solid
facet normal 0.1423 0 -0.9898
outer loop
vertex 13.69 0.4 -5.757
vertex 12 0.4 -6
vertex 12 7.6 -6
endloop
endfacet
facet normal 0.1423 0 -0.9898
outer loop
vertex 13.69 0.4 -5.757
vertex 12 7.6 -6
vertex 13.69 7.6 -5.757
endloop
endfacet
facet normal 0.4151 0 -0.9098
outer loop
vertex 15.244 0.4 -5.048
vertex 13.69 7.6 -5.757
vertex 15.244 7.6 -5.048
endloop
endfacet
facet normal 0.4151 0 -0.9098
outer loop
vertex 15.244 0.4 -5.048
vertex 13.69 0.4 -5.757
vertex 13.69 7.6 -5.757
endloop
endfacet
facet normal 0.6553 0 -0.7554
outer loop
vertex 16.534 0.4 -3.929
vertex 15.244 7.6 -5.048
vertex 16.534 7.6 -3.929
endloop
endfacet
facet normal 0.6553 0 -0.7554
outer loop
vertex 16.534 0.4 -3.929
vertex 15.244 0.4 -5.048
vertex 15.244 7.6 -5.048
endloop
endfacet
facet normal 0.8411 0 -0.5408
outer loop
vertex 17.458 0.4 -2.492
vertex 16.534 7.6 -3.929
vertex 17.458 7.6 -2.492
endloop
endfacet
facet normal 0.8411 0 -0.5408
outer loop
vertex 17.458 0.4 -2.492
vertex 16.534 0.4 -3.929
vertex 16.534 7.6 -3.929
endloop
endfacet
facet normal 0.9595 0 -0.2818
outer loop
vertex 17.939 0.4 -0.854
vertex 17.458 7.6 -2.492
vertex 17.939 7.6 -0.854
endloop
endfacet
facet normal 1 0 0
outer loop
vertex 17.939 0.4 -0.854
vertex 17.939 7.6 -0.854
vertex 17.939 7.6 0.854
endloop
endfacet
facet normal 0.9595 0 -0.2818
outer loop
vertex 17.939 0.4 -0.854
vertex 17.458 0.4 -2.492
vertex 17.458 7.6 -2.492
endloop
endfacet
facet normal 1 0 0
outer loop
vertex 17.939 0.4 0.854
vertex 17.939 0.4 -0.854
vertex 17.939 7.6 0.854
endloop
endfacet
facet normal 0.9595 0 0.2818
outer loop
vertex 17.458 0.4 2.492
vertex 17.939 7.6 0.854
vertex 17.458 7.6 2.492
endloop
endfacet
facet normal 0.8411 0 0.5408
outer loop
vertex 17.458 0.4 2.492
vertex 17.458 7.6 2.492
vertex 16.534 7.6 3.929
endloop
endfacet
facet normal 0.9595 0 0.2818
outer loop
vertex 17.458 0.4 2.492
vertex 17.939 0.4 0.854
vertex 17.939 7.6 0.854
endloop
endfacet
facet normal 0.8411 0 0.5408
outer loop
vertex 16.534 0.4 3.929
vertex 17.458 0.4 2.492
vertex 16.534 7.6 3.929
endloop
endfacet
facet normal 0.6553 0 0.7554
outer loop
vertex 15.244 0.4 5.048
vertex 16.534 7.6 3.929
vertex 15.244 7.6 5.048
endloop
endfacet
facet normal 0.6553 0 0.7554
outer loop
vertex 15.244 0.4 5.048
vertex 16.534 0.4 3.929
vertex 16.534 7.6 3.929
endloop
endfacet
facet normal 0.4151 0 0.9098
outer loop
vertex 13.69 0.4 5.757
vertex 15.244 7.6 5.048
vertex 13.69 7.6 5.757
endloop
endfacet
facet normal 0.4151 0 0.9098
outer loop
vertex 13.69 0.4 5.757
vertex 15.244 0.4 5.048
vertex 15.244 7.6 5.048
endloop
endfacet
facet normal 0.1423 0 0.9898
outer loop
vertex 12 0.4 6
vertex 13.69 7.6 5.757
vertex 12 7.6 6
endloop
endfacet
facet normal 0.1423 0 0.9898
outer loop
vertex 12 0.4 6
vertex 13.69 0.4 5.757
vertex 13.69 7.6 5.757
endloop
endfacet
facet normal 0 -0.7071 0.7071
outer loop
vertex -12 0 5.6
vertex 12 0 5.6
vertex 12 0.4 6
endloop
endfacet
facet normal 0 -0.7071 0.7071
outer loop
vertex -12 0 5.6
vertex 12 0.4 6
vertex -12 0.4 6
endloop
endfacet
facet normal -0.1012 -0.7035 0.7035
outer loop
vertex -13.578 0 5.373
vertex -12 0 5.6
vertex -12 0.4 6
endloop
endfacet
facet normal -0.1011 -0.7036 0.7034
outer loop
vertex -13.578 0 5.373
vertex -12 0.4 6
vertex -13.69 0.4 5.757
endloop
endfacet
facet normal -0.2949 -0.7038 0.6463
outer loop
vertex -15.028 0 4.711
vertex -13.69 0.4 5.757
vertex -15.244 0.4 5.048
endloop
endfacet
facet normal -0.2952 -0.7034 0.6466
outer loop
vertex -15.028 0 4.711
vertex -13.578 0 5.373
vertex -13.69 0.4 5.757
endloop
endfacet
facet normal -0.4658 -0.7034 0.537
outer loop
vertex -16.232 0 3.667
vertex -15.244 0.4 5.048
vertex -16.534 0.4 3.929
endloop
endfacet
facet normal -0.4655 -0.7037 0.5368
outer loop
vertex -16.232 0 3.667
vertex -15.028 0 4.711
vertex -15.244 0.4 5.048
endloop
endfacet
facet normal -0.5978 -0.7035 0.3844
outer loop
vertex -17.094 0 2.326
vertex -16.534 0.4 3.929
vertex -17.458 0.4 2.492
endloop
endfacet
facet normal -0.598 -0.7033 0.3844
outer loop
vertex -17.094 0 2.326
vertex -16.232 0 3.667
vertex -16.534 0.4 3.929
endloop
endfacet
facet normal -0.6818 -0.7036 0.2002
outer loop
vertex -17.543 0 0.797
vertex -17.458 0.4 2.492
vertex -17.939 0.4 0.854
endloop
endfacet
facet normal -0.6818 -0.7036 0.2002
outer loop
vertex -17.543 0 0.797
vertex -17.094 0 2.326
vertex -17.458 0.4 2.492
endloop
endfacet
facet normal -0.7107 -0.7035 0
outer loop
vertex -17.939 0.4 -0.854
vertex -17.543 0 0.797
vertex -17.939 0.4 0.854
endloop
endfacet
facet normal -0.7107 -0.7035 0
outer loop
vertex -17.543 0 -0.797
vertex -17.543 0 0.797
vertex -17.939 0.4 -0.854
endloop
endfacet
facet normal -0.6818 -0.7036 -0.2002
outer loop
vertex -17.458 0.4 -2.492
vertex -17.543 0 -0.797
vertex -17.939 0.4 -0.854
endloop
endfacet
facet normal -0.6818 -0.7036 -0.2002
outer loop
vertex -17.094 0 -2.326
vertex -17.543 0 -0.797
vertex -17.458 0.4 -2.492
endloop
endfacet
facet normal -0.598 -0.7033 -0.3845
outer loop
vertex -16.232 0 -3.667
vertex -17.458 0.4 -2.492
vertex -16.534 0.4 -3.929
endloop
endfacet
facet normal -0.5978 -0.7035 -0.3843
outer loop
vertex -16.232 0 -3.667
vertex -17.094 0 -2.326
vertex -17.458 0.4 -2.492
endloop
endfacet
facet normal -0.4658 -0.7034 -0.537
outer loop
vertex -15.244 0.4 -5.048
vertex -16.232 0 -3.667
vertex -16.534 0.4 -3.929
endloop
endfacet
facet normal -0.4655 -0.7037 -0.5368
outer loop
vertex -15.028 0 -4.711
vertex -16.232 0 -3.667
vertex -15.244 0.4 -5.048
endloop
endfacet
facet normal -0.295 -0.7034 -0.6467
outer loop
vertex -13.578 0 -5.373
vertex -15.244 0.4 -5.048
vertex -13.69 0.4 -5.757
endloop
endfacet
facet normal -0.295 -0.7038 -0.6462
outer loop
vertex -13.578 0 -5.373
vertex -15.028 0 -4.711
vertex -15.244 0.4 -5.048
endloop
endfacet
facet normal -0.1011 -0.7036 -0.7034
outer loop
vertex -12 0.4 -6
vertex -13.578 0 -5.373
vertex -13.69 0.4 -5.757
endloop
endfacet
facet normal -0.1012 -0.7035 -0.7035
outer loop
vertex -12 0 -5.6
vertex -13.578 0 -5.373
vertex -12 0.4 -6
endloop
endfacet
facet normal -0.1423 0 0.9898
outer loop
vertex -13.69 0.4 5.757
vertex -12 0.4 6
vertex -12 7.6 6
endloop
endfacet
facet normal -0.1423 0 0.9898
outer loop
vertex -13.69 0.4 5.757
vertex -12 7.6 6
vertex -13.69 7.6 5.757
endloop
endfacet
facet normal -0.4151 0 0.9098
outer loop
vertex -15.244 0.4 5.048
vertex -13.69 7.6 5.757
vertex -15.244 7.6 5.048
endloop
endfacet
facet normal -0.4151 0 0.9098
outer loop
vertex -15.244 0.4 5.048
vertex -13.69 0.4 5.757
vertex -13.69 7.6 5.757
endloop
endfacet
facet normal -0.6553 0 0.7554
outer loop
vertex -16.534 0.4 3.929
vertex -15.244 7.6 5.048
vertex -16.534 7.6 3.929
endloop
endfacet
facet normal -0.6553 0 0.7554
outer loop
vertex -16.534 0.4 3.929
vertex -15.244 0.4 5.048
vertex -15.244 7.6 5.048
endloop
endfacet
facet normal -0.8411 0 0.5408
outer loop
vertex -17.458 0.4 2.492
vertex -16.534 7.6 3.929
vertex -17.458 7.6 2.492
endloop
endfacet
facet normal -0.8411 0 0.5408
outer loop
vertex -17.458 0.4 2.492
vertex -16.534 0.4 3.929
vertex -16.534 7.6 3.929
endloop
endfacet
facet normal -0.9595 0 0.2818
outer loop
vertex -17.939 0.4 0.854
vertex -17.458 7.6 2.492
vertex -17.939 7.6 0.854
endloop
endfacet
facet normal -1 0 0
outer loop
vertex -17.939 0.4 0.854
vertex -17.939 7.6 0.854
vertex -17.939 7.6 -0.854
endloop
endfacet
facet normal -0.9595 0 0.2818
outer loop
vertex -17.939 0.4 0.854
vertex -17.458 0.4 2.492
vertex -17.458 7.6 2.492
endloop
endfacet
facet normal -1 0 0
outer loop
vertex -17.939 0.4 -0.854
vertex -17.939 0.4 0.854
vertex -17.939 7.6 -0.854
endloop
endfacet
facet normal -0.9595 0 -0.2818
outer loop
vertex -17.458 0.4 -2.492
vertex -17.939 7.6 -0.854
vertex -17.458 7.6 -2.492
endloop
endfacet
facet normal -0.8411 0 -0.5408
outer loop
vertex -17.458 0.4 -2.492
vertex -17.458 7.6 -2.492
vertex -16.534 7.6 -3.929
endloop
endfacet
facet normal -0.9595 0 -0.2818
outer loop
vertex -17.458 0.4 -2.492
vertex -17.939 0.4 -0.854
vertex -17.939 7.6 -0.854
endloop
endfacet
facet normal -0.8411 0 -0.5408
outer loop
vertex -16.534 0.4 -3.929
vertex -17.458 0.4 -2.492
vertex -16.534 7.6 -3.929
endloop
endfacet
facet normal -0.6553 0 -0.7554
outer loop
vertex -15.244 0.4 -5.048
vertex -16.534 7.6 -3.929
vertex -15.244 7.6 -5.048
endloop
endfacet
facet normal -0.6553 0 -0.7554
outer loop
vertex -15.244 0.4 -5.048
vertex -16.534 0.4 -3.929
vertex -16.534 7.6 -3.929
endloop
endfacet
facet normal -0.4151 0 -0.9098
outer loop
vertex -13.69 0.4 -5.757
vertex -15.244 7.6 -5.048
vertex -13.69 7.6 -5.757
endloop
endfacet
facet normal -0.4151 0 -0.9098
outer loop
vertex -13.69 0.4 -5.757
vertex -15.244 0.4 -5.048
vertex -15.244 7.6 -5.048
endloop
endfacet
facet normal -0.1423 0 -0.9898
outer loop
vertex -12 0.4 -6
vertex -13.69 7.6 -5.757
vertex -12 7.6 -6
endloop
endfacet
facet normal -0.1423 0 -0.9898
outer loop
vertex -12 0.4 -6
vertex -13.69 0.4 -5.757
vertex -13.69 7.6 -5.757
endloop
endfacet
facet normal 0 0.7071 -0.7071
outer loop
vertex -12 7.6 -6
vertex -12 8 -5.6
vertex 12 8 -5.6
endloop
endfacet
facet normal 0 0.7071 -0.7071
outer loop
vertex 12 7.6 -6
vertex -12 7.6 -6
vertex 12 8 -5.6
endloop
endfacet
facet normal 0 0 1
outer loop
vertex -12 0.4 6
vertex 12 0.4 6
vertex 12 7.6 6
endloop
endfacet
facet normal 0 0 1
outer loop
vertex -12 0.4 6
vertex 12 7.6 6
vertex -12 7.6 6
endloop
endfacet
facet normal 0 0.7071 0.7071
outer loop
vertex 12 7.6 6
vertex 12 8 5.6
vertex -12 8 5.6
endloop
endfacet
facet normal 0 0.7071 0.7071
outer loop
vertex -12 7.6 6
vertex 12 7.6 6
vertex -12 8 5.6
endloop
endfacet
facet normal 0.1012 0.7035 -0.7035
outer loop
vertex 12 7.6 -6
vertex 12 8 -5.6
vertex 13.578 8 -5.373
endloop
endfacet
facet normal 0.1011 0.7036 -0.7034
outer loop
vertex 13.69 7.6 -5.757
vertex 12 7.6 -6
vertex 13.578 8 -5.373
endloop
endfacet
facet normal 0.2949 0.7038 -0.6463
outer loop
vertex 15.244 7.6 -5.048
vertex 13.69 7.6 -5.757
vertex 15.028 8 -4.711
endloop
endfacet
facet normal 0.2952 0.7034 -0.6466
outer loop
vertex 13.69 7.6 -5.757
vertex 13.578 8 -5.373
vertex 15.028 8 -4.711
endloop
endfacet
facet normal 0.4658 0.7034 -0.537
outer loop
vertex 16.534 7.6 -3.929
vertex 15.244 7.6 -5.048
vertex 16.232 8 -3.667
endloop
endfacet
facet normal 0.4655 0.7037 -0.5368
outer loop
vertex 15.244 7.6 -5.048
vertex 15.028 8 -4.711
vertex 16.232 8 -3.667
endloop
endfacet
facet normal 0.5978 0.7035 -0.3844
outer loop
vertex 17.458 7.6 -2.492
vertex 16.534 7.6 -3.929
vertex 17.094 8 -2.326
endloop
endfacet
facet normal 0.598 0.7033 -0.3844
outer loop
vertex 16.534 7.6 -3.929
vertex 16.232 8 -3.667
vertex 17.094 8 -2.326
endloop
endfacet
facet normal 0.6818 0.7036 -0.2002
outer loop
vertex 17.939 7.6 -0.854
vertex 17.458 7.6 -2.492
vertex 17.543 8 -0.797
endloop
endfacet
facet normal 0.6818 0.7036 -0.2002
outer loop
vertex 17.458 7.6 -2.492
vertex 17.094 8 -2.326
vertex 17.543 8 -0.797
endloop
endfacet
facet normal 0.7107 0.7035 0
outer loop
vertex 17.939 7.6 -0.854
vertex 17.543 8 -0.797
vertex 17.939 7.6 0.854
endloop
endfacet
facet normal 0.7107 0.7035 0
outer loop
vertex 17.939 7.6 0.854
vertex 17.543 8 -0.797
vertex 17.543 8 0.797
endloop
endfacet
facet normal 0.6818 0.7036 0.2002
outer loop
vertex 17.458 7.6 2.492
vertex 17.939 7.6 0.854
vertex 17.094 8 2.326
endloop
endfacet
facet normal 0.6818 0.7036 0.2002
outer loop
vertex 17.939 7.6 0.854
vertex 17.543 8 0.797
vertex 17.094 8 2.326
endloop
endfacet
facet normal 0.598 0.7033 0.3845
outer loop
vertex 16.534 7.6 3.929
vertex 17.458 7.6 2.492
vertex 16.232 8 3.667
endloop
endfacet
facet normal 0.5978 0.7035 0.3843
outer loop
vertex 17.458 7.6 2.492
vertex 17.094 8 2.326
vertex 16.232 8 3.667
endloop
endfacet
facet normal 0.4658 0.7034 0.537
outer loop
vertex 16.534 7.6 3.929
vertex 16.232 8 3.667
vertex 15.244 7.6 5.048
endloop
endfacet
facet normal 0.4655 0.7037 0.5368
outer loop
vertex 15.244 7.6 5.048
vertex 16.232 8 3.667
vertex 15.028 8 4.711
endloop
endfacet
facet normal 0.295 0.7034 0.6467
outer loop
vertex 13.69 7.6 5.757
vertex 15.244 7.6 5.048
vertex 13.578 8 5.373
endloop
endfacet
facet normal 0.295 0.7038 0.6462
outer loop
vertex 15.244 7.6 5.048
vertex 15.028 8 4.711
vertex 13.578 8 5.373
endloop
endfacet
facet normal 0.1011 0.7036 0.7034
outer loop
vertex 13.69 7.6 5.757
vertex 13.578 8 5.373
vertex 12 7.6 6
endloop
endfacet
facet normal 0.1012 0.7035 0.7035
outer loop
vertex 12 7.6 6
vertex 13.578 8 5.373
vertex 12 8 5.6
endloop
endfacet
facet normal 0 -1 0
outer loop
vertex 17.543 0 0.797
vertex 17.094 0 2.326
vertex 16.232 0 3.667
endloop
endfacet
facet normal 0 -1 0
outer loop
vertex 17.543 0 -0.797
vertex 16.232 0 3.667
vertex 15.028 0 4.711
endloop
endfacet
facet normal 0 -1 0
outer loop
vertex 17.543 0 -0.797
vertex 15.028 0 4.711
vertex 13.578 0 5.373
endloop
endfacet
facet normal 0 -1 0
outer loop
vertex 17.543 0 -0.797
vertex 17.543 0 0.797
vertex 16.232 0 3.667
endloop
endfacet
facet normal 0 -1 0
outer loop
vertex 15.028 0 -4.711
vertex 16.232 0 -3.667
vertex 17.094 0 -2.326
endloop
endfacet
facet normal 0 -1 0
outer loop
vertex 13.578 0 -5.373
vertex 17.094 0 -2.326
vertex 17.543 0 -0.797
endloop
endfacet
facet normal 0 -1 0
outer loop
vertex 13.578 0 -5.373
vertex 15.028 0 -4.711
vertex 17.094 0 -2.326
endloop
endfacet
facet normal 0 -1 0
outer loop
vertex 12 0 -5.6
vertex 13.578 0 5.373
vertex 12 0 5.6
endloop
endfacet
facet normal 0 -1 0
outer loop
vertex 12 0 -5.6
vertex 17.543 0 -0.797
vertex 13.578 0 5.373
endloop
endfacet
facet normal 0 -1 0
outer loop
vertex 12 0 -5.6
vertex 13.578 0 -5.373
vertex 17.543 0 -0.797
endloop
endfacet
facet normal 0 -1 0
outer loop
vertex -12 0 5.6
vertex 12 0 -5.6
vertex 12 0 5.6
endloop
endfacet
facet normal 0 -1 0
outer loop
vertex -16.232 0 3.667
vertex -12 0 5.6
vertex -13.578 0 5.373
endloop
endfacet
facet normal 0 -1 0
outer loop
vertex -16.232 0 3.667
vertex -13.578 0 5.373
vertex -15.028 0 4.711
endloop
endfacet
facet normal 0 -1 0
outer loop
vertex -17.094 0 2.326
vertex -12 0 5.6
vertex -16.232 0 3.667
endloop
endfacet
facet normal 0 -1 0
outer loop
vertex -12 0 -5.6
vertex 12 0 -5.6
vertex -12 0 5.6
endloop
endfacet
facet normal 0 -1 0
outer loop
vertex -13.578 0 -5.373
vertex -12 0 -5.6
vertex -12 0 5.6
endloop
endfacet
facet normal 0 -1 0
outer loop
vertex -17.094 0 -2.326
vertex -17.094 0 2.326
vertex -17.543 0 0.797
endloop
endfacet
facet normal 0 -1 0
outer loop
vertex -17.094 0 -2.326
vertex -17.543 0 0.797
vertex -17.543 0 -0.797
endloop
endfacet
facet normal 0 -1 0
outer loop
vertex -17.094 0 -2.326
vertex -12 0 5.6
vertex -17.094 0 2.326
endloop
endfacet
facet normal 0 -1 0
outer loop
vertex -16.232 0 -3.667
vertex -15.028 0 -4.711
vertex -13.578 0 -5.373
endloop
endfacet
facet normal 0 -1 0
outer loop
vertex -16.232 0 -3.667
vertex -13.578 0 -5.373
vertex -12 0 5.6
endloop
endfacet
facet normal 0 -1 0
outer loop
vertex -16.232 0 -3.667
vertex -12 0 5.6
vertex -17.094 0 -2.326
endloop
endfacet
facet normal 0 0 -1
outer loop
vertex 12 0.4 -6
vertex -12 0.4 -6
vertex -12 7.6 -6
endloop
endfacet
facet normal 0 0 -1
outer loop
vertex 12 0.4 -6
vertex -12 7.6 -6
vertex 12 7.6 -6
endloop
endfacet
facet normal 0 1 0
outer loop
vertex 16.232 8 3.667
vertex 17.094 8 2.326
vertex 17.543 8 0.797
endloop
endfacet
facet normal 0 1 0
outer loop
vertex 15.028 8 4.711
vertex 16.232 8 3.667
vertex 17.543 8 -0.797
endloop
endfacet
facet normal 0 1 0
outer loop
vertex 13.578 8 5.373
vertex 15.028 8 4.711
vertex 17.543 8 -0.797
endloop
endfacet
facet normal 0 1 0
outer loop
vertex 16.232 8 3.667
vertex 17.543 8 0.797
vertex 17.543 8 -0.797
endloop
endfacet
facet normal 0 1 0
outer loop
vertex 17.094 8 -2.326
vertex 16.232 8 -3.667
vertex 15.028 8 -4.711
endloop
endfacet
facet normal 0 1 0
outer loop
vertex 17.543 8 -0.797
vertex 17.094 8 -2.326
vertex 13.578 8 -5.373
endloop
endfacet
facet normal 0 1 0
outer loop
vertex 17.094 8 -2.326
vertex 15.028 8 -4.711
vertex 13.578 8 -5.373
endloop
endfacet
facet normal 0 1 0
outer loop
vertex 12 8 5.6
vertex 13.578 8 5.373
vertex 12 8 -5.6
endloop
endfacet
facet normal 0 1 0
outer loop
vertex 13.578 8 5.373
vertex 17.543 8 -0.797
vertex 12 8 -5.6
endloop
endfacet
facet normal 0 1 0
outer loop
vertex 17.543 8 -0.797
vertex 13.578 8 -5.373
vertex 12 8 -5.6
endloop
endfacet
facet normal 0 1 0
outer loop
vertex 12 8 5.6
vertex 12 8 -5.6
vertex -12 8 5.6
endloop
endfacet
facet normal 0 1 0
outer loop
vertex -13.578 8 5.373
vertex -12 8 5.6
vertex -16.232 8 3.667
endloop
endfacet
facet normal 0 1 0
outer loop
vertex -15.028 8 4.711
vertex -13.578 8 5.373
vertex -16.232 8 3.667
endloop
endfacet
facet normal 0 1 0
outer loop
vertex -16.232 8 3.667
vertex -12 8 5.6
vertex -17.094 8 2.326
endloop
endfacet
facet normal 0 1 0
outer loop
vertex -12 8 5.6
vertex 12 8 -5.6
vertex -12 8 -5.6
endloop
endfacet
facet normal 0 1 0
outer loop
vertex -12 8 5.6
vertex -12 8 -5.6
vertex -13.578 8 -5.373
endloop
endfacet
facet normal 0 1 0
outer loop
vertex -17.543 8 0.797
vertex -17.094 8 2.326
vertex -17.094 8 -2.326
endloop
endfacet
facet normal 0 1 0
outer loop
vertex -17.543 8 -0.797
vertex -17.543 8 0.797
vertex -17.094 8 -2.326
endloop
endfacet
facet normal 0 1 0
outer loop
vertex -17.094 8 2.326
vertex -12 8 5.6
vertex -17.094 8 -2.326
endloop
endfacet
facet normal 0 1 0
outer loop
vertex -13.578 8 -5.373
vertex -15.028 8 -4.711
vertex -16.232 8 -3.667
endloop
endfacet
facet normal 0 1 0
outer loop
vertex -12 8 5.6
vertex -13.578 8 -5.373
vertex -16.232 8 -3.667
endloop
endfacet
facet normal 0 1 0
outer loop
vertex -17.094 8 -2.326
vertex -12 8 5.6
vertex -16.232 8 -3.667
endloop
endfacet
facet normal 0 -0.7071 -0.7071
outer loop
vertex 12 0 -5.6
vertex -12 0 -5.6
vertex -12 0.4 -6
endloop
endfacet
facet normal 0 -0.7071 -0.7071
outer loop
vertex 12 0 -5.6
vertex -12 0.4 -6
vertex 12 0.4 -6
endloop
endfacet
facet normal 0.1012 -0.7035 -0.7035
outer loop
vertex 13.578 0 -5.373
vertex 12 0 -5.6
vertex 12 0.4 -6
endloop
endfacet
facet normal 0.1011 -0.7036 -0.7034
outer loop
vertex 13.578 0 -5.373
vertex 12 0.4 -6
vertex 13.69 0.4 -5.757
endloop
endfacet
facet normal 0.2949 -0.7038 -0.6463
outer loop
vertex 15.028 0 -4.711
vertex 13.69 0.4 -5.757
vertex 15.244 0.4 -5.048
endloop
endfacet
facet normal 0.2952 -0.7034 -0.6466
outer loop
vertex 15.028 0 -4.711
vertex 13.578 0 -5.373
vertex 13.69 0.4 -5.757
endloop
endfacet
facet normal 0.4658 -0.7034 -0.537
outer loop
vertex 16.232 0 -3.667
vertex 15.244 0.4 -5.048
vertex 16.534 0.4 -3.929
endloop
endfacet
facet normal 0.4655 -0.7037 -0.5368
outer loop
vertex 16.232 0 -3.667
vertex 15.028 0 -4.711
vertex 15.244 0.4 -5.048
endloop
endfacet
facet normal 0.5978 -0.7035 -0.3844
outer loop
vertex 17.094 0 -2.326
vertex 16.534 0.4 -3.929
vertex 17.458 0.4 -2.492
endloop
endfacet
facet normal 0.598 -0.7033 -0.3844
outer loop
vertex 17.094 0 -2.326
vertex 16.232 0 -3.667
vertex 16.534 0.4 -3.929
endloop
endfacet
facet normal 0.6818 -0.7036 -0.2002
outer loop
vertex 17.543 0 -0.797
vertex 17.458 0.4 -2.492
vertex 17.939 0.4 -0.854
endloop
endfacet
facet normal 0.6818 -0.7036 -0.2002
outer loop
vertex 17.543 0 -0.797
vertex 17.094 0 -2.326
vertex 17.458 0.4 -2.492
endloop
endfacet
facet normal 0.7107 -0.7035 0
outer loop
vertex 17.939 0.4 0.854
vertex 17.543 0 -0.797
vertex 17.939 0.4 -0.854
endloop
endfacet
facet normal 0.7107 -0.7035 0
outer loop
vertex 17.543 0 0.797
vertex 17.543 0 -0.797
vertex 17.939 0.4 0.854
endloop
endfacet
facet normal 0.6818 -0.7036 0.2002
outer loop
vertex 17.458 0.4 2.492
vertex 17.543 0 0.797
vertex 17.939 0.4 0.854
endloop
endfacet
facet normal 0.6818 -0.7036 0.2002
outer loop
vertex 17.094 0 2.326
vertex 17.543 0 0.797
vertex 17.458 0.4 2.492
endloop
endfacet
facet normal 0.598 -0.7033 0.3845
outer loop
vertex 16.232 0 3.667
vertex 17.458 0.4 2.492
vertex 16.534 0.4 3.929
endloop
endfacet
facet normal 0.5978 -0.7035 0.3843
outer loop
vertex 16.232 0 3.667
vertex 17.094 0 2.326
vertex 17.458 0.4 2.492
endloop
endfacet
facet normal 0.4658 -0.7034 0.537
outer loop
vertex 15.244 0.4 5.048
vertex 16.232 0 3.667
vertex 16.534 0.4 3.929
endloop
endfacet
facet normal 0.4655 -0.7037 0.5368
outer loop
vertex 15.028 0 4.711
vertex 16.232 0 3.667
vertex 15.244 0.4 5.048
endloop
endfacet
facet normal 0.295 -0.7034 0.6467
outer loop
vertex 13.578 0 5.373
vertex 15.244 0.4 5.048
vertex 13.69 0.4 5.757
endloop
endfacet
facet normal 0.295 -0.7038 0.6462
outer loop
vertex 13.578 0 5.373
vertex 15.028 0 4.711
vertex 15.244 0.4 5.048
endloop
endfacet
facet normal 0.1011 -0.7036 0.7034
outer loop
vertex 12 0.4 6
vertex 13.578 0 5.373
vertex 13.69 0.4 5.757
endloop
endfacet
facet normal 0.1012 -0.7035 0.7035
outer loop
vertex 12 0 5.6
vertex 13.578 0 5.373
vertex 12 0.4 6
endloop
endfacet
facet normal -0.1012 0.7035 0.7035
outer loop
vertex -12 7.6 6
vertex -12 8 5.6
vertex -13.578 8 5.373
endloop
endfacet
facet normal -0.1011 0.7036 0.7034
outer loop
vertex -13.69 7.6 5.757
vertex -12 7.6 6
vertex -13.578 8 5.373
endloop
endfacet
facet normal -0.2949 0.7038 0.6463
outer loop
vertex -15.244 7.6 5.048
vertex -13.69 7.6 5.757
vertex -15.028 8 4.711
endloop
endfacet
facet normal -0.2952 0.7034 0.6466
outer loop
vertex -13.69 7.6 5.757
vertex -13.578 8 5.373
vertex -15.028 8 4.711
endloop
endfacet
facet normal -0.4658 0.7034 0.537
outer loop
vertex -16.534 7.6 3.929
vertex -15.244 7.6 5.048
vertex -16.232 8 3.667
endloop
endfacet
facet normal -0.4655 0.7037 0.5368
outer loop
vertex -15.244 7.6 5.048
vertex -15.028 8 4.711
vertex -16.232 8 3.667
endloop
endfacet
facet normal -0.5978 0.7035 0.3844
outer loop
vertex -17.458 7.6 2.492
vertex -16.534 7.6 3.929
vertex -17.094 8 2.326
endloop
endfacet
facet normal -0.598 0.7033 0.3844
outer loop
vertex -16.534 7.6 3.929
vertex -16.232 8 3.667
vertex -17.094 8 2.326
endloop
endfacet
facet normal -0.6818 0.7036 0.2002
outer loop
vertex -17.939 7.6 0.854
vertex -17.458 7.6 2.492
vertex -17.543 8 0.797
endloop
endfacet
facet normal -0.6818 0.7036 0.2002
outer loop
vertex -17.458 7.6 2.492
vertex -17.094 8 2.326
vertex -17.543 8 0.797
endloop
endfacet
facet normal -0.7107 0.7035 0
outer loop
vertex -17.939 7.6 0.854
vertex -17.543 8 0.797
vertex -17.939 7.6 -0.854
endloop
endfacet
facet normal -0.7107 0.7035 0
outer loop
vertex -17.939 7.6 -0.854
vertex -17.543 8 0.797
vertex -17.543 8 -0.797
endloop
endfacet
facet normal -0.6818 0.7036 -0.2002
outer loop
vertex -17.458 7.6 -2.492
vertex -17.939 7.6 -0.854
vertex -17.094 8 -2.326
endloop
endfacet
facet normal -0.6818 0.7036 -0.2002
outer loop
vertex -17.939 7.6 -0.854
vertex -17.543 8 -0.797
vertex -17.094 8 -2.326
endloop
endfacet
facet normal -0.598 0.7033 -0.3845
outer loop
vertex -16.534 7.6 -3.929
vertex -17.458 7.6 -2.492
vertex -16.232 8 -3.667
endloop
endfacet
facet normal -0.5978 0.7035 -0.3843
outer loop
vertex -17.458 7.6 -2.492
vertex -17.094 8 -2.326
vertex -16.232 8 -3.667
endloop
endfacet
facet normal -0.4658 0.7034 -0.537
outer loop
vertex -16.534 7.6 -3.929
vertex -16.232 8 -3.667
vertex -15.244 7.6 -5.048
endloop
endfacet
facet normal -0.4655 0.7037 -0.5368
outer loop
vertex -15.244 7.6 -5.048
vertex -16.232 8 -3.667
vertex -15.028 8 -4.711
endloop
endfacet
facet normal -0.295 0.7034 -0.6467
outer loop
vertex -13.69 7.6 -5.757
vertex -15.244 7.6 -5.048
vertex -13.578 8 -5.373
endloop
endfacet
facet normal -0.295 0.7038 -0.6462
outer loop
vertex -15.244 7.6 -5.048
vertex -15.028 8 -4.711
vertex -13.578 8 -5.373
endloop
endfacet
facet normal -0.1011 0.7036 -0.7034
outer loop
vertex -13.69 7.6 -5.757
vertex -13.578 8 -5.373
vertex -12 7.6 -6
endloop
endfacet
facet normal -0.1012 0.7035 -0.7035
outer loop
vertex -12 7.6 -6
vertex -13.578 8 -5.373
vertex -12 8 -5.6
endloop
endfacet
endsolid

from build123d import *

# Parameters (mm, degrees)
EXTRUDE_1_DEPTH = 8
CHAMFER_1_SIZE  = 0.4
CHAMFER_2_SIZE  = 0.4


with BuildPart() as part:
    # 草图1 → 凸台-拉伸1 (new body)
    with BuildSketch(Plane(origin=(0, 0, 0), x_dir=(1, 0, 0), z_dir=(0, 1, 0))):
        with BuildLine():
            Line((-12, 6), (12, 6))
            ThreePointArc((12, 6), (18, 0), (12, -6))
            Line((12, -6), (-12, -6))
            ThreePointArc((-12, -6), (-18, 0), (-12, 6))
        make_face()
    extrude(amount=EXTRUDE_1_DEPTH)

    # 倒角1
    chamfer_1_edges = [part.edges().sort_by_distance(p)[0] for p in [
        (18, 8, 0),
        (0, 8, -6),
        (-18, 8, 0),
        (0, 8, 6),
    ]]
    chamfer(chamfer_1_edges, length=CHAMFER_1_SIZE)

    # 倒角2
    chamfer_2_edges = [part.edges().sort_by_distance(p)[0] for p in [
        (0, 0, -6),
        (18, 0, 0),
        (0, 0, 6),
        (-18, 0, 0),
    ]]
    chamfer(chamfer_2_edges, length=CHAMFER_2_SIZE)


solid = part.part
